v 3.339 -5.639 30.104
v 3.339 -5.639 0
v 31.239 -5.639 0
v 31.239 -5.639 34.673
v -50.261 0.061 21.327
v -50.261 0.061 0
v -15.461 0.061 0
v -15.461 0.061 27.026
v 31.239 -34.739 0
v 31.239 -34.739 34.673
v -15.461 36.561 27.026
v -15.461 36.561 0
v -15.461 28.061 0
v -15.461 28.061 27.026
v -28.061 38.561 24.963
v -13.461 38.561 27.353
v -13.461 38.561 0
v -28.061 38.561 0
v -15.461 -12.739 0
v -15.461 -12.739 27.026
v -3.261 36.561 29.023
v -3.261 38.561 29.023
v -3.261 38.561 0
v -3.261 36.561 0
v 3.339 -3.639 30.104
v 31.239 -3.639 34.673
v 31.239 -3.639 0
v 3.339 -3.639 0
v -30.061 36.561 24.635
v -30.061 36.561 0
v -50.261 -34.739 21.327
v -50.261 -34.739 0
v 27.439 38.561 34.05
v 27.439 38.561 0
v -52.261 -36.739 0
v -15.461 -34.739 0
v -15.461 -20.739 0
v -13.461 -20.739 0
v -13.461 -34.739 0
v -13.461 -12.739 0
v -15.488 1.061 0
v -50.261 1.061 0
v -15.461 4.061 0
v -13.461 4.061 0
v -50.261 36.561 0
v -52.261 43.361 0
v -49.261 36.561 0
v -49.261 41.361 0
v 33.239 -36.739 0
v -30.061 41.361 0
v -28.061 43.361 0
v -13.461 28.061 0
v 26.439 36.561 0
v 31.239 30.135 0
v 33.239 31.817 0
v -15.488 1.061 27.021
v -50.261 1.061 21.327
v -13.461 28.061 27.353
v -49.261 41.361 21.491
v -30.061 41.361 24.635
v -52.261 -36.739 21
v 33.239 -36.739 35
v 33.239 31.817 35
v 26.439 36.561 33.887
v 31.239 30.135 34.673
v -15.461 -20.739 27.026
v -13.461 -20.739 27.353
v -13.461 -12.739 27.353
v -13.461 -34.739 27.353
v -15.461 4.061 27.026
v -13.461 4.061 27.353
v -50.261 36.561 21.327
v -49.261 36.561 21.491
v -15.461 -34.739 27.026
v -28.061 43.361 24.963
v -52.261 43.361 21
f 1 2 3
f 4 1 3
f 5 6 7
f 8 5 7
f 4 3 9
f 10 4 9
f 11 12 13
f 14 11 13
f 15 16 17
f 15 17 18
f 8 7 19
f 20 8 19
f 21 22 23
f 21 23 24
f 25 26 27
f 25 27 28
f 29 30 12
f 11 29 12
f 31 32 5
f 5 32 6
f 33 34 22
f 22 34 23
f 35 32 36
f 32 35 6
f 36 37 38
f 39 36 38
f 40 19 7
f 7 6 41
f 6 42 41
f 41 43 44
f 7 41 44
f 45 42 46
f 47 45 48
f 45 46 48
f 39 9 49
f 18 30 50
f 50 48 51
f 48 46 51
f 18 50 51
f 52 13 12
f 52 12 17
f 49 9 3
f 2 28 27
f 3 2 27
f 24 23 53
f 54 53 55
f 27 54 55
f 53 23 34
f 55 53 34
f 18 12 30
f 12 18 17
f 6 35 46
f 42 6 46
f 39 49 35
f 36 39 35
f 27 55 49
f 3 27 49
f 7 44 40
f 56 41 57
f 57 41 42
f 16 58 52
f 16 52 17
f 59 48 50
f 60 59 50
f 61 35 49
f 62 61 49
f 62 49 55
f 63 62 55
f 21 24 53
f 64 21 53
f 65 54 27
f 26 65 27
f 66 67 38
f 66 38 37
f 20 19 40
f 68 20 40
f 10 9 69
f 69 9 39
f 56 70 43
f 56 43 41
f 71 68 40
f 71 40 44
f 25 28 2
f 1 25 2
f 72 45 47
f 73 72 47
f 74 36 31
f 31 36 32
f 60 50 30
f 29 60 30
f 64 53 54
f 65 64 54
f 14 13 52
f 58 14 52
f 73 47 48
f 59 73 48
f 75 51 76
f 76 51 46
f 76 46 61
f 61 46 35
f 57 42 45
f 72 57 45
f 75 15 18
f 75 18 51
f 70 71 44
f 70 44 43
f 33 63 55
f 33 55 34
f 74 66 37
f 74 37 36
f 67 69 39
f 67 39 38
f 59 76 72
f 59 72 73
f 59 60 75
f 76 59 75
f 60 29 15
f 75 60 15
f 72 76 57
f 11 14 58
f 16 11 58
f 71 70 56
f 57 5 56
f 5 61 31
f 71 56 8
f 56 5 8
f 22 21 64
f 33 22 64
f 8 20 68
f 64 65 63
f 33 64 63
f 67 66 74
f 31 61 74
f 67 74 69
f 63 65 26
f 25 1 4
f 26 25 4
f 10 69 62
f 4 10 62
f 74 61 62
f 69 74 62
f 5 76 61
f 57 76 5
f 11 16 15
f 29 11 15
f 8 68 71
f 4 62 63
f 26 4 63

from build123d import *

# Parameters (mm, degrees)
F1_DEPTH = 35
F3_DEPTH = 90


with BuildPart() as f1:
    # F0 (on Top) → F1 (new body)
    with BuildSketch(Plane.XY):
        Polygon((-50.260506, 1.061057), (-50.260506, 36.561057), (-49.260506, 36.561057), (-49.260506, 41.361057), (-30.060506, 41.361057), (-30.060506, 36.561057), (-15.460506, 36.561057), (-15.460506, 28.061057), (-13.460506, 28.061057), (-13.460506, 38.561057), (-28.060506, 38.561057), (-28.060506, 43.361057), (-50.260506, 43.361057), (-52.260506, 43.361057), (-52.260506, -36.738943), (-13.460506, -36.738943), (33.239494, -36.738943), (33.239494, 31.816978), (27.439494, 38.561057), (-3.260506, 38.561057), (-3.260506, 36.561057), (26.439494, 36.561057), (31.239494, 30.135054), (31.239494, -3.638943), (3.339494, -3.638943), (3.339494, -5.638943), (31.239494, -5.638943), (31.239494, -34.738943), (-13.460506, -34.738943), (-13.460506, -20.738943), (-15.460506, -20.738943), (-15.460506, -34.738943), (-50.260506, -34.738943), (-50.260506, 0.061057), (-15.460506, 0.061057), (-15.460506, -12.738943), (-13.460506, -12.738943), (-13.460506, 4.061057), (-15.460506, 4.061057), (-15.487555, 1.061057), align=None)
    extrude(amount=F1_DEPTH)

    # F2 (on face) → F3 (cut)
    with BuildSketch(Plane.XZ.offset(36.738943)):
        Polygon((-52.260506, 61.379157), (-52.260506, 21), (33.239494, 35), (27.843312, 67.955256), align=None)
    extrude(amount=-F3_DEPTH, mode=Mode.SUBTRACT)


solid = f1.part
